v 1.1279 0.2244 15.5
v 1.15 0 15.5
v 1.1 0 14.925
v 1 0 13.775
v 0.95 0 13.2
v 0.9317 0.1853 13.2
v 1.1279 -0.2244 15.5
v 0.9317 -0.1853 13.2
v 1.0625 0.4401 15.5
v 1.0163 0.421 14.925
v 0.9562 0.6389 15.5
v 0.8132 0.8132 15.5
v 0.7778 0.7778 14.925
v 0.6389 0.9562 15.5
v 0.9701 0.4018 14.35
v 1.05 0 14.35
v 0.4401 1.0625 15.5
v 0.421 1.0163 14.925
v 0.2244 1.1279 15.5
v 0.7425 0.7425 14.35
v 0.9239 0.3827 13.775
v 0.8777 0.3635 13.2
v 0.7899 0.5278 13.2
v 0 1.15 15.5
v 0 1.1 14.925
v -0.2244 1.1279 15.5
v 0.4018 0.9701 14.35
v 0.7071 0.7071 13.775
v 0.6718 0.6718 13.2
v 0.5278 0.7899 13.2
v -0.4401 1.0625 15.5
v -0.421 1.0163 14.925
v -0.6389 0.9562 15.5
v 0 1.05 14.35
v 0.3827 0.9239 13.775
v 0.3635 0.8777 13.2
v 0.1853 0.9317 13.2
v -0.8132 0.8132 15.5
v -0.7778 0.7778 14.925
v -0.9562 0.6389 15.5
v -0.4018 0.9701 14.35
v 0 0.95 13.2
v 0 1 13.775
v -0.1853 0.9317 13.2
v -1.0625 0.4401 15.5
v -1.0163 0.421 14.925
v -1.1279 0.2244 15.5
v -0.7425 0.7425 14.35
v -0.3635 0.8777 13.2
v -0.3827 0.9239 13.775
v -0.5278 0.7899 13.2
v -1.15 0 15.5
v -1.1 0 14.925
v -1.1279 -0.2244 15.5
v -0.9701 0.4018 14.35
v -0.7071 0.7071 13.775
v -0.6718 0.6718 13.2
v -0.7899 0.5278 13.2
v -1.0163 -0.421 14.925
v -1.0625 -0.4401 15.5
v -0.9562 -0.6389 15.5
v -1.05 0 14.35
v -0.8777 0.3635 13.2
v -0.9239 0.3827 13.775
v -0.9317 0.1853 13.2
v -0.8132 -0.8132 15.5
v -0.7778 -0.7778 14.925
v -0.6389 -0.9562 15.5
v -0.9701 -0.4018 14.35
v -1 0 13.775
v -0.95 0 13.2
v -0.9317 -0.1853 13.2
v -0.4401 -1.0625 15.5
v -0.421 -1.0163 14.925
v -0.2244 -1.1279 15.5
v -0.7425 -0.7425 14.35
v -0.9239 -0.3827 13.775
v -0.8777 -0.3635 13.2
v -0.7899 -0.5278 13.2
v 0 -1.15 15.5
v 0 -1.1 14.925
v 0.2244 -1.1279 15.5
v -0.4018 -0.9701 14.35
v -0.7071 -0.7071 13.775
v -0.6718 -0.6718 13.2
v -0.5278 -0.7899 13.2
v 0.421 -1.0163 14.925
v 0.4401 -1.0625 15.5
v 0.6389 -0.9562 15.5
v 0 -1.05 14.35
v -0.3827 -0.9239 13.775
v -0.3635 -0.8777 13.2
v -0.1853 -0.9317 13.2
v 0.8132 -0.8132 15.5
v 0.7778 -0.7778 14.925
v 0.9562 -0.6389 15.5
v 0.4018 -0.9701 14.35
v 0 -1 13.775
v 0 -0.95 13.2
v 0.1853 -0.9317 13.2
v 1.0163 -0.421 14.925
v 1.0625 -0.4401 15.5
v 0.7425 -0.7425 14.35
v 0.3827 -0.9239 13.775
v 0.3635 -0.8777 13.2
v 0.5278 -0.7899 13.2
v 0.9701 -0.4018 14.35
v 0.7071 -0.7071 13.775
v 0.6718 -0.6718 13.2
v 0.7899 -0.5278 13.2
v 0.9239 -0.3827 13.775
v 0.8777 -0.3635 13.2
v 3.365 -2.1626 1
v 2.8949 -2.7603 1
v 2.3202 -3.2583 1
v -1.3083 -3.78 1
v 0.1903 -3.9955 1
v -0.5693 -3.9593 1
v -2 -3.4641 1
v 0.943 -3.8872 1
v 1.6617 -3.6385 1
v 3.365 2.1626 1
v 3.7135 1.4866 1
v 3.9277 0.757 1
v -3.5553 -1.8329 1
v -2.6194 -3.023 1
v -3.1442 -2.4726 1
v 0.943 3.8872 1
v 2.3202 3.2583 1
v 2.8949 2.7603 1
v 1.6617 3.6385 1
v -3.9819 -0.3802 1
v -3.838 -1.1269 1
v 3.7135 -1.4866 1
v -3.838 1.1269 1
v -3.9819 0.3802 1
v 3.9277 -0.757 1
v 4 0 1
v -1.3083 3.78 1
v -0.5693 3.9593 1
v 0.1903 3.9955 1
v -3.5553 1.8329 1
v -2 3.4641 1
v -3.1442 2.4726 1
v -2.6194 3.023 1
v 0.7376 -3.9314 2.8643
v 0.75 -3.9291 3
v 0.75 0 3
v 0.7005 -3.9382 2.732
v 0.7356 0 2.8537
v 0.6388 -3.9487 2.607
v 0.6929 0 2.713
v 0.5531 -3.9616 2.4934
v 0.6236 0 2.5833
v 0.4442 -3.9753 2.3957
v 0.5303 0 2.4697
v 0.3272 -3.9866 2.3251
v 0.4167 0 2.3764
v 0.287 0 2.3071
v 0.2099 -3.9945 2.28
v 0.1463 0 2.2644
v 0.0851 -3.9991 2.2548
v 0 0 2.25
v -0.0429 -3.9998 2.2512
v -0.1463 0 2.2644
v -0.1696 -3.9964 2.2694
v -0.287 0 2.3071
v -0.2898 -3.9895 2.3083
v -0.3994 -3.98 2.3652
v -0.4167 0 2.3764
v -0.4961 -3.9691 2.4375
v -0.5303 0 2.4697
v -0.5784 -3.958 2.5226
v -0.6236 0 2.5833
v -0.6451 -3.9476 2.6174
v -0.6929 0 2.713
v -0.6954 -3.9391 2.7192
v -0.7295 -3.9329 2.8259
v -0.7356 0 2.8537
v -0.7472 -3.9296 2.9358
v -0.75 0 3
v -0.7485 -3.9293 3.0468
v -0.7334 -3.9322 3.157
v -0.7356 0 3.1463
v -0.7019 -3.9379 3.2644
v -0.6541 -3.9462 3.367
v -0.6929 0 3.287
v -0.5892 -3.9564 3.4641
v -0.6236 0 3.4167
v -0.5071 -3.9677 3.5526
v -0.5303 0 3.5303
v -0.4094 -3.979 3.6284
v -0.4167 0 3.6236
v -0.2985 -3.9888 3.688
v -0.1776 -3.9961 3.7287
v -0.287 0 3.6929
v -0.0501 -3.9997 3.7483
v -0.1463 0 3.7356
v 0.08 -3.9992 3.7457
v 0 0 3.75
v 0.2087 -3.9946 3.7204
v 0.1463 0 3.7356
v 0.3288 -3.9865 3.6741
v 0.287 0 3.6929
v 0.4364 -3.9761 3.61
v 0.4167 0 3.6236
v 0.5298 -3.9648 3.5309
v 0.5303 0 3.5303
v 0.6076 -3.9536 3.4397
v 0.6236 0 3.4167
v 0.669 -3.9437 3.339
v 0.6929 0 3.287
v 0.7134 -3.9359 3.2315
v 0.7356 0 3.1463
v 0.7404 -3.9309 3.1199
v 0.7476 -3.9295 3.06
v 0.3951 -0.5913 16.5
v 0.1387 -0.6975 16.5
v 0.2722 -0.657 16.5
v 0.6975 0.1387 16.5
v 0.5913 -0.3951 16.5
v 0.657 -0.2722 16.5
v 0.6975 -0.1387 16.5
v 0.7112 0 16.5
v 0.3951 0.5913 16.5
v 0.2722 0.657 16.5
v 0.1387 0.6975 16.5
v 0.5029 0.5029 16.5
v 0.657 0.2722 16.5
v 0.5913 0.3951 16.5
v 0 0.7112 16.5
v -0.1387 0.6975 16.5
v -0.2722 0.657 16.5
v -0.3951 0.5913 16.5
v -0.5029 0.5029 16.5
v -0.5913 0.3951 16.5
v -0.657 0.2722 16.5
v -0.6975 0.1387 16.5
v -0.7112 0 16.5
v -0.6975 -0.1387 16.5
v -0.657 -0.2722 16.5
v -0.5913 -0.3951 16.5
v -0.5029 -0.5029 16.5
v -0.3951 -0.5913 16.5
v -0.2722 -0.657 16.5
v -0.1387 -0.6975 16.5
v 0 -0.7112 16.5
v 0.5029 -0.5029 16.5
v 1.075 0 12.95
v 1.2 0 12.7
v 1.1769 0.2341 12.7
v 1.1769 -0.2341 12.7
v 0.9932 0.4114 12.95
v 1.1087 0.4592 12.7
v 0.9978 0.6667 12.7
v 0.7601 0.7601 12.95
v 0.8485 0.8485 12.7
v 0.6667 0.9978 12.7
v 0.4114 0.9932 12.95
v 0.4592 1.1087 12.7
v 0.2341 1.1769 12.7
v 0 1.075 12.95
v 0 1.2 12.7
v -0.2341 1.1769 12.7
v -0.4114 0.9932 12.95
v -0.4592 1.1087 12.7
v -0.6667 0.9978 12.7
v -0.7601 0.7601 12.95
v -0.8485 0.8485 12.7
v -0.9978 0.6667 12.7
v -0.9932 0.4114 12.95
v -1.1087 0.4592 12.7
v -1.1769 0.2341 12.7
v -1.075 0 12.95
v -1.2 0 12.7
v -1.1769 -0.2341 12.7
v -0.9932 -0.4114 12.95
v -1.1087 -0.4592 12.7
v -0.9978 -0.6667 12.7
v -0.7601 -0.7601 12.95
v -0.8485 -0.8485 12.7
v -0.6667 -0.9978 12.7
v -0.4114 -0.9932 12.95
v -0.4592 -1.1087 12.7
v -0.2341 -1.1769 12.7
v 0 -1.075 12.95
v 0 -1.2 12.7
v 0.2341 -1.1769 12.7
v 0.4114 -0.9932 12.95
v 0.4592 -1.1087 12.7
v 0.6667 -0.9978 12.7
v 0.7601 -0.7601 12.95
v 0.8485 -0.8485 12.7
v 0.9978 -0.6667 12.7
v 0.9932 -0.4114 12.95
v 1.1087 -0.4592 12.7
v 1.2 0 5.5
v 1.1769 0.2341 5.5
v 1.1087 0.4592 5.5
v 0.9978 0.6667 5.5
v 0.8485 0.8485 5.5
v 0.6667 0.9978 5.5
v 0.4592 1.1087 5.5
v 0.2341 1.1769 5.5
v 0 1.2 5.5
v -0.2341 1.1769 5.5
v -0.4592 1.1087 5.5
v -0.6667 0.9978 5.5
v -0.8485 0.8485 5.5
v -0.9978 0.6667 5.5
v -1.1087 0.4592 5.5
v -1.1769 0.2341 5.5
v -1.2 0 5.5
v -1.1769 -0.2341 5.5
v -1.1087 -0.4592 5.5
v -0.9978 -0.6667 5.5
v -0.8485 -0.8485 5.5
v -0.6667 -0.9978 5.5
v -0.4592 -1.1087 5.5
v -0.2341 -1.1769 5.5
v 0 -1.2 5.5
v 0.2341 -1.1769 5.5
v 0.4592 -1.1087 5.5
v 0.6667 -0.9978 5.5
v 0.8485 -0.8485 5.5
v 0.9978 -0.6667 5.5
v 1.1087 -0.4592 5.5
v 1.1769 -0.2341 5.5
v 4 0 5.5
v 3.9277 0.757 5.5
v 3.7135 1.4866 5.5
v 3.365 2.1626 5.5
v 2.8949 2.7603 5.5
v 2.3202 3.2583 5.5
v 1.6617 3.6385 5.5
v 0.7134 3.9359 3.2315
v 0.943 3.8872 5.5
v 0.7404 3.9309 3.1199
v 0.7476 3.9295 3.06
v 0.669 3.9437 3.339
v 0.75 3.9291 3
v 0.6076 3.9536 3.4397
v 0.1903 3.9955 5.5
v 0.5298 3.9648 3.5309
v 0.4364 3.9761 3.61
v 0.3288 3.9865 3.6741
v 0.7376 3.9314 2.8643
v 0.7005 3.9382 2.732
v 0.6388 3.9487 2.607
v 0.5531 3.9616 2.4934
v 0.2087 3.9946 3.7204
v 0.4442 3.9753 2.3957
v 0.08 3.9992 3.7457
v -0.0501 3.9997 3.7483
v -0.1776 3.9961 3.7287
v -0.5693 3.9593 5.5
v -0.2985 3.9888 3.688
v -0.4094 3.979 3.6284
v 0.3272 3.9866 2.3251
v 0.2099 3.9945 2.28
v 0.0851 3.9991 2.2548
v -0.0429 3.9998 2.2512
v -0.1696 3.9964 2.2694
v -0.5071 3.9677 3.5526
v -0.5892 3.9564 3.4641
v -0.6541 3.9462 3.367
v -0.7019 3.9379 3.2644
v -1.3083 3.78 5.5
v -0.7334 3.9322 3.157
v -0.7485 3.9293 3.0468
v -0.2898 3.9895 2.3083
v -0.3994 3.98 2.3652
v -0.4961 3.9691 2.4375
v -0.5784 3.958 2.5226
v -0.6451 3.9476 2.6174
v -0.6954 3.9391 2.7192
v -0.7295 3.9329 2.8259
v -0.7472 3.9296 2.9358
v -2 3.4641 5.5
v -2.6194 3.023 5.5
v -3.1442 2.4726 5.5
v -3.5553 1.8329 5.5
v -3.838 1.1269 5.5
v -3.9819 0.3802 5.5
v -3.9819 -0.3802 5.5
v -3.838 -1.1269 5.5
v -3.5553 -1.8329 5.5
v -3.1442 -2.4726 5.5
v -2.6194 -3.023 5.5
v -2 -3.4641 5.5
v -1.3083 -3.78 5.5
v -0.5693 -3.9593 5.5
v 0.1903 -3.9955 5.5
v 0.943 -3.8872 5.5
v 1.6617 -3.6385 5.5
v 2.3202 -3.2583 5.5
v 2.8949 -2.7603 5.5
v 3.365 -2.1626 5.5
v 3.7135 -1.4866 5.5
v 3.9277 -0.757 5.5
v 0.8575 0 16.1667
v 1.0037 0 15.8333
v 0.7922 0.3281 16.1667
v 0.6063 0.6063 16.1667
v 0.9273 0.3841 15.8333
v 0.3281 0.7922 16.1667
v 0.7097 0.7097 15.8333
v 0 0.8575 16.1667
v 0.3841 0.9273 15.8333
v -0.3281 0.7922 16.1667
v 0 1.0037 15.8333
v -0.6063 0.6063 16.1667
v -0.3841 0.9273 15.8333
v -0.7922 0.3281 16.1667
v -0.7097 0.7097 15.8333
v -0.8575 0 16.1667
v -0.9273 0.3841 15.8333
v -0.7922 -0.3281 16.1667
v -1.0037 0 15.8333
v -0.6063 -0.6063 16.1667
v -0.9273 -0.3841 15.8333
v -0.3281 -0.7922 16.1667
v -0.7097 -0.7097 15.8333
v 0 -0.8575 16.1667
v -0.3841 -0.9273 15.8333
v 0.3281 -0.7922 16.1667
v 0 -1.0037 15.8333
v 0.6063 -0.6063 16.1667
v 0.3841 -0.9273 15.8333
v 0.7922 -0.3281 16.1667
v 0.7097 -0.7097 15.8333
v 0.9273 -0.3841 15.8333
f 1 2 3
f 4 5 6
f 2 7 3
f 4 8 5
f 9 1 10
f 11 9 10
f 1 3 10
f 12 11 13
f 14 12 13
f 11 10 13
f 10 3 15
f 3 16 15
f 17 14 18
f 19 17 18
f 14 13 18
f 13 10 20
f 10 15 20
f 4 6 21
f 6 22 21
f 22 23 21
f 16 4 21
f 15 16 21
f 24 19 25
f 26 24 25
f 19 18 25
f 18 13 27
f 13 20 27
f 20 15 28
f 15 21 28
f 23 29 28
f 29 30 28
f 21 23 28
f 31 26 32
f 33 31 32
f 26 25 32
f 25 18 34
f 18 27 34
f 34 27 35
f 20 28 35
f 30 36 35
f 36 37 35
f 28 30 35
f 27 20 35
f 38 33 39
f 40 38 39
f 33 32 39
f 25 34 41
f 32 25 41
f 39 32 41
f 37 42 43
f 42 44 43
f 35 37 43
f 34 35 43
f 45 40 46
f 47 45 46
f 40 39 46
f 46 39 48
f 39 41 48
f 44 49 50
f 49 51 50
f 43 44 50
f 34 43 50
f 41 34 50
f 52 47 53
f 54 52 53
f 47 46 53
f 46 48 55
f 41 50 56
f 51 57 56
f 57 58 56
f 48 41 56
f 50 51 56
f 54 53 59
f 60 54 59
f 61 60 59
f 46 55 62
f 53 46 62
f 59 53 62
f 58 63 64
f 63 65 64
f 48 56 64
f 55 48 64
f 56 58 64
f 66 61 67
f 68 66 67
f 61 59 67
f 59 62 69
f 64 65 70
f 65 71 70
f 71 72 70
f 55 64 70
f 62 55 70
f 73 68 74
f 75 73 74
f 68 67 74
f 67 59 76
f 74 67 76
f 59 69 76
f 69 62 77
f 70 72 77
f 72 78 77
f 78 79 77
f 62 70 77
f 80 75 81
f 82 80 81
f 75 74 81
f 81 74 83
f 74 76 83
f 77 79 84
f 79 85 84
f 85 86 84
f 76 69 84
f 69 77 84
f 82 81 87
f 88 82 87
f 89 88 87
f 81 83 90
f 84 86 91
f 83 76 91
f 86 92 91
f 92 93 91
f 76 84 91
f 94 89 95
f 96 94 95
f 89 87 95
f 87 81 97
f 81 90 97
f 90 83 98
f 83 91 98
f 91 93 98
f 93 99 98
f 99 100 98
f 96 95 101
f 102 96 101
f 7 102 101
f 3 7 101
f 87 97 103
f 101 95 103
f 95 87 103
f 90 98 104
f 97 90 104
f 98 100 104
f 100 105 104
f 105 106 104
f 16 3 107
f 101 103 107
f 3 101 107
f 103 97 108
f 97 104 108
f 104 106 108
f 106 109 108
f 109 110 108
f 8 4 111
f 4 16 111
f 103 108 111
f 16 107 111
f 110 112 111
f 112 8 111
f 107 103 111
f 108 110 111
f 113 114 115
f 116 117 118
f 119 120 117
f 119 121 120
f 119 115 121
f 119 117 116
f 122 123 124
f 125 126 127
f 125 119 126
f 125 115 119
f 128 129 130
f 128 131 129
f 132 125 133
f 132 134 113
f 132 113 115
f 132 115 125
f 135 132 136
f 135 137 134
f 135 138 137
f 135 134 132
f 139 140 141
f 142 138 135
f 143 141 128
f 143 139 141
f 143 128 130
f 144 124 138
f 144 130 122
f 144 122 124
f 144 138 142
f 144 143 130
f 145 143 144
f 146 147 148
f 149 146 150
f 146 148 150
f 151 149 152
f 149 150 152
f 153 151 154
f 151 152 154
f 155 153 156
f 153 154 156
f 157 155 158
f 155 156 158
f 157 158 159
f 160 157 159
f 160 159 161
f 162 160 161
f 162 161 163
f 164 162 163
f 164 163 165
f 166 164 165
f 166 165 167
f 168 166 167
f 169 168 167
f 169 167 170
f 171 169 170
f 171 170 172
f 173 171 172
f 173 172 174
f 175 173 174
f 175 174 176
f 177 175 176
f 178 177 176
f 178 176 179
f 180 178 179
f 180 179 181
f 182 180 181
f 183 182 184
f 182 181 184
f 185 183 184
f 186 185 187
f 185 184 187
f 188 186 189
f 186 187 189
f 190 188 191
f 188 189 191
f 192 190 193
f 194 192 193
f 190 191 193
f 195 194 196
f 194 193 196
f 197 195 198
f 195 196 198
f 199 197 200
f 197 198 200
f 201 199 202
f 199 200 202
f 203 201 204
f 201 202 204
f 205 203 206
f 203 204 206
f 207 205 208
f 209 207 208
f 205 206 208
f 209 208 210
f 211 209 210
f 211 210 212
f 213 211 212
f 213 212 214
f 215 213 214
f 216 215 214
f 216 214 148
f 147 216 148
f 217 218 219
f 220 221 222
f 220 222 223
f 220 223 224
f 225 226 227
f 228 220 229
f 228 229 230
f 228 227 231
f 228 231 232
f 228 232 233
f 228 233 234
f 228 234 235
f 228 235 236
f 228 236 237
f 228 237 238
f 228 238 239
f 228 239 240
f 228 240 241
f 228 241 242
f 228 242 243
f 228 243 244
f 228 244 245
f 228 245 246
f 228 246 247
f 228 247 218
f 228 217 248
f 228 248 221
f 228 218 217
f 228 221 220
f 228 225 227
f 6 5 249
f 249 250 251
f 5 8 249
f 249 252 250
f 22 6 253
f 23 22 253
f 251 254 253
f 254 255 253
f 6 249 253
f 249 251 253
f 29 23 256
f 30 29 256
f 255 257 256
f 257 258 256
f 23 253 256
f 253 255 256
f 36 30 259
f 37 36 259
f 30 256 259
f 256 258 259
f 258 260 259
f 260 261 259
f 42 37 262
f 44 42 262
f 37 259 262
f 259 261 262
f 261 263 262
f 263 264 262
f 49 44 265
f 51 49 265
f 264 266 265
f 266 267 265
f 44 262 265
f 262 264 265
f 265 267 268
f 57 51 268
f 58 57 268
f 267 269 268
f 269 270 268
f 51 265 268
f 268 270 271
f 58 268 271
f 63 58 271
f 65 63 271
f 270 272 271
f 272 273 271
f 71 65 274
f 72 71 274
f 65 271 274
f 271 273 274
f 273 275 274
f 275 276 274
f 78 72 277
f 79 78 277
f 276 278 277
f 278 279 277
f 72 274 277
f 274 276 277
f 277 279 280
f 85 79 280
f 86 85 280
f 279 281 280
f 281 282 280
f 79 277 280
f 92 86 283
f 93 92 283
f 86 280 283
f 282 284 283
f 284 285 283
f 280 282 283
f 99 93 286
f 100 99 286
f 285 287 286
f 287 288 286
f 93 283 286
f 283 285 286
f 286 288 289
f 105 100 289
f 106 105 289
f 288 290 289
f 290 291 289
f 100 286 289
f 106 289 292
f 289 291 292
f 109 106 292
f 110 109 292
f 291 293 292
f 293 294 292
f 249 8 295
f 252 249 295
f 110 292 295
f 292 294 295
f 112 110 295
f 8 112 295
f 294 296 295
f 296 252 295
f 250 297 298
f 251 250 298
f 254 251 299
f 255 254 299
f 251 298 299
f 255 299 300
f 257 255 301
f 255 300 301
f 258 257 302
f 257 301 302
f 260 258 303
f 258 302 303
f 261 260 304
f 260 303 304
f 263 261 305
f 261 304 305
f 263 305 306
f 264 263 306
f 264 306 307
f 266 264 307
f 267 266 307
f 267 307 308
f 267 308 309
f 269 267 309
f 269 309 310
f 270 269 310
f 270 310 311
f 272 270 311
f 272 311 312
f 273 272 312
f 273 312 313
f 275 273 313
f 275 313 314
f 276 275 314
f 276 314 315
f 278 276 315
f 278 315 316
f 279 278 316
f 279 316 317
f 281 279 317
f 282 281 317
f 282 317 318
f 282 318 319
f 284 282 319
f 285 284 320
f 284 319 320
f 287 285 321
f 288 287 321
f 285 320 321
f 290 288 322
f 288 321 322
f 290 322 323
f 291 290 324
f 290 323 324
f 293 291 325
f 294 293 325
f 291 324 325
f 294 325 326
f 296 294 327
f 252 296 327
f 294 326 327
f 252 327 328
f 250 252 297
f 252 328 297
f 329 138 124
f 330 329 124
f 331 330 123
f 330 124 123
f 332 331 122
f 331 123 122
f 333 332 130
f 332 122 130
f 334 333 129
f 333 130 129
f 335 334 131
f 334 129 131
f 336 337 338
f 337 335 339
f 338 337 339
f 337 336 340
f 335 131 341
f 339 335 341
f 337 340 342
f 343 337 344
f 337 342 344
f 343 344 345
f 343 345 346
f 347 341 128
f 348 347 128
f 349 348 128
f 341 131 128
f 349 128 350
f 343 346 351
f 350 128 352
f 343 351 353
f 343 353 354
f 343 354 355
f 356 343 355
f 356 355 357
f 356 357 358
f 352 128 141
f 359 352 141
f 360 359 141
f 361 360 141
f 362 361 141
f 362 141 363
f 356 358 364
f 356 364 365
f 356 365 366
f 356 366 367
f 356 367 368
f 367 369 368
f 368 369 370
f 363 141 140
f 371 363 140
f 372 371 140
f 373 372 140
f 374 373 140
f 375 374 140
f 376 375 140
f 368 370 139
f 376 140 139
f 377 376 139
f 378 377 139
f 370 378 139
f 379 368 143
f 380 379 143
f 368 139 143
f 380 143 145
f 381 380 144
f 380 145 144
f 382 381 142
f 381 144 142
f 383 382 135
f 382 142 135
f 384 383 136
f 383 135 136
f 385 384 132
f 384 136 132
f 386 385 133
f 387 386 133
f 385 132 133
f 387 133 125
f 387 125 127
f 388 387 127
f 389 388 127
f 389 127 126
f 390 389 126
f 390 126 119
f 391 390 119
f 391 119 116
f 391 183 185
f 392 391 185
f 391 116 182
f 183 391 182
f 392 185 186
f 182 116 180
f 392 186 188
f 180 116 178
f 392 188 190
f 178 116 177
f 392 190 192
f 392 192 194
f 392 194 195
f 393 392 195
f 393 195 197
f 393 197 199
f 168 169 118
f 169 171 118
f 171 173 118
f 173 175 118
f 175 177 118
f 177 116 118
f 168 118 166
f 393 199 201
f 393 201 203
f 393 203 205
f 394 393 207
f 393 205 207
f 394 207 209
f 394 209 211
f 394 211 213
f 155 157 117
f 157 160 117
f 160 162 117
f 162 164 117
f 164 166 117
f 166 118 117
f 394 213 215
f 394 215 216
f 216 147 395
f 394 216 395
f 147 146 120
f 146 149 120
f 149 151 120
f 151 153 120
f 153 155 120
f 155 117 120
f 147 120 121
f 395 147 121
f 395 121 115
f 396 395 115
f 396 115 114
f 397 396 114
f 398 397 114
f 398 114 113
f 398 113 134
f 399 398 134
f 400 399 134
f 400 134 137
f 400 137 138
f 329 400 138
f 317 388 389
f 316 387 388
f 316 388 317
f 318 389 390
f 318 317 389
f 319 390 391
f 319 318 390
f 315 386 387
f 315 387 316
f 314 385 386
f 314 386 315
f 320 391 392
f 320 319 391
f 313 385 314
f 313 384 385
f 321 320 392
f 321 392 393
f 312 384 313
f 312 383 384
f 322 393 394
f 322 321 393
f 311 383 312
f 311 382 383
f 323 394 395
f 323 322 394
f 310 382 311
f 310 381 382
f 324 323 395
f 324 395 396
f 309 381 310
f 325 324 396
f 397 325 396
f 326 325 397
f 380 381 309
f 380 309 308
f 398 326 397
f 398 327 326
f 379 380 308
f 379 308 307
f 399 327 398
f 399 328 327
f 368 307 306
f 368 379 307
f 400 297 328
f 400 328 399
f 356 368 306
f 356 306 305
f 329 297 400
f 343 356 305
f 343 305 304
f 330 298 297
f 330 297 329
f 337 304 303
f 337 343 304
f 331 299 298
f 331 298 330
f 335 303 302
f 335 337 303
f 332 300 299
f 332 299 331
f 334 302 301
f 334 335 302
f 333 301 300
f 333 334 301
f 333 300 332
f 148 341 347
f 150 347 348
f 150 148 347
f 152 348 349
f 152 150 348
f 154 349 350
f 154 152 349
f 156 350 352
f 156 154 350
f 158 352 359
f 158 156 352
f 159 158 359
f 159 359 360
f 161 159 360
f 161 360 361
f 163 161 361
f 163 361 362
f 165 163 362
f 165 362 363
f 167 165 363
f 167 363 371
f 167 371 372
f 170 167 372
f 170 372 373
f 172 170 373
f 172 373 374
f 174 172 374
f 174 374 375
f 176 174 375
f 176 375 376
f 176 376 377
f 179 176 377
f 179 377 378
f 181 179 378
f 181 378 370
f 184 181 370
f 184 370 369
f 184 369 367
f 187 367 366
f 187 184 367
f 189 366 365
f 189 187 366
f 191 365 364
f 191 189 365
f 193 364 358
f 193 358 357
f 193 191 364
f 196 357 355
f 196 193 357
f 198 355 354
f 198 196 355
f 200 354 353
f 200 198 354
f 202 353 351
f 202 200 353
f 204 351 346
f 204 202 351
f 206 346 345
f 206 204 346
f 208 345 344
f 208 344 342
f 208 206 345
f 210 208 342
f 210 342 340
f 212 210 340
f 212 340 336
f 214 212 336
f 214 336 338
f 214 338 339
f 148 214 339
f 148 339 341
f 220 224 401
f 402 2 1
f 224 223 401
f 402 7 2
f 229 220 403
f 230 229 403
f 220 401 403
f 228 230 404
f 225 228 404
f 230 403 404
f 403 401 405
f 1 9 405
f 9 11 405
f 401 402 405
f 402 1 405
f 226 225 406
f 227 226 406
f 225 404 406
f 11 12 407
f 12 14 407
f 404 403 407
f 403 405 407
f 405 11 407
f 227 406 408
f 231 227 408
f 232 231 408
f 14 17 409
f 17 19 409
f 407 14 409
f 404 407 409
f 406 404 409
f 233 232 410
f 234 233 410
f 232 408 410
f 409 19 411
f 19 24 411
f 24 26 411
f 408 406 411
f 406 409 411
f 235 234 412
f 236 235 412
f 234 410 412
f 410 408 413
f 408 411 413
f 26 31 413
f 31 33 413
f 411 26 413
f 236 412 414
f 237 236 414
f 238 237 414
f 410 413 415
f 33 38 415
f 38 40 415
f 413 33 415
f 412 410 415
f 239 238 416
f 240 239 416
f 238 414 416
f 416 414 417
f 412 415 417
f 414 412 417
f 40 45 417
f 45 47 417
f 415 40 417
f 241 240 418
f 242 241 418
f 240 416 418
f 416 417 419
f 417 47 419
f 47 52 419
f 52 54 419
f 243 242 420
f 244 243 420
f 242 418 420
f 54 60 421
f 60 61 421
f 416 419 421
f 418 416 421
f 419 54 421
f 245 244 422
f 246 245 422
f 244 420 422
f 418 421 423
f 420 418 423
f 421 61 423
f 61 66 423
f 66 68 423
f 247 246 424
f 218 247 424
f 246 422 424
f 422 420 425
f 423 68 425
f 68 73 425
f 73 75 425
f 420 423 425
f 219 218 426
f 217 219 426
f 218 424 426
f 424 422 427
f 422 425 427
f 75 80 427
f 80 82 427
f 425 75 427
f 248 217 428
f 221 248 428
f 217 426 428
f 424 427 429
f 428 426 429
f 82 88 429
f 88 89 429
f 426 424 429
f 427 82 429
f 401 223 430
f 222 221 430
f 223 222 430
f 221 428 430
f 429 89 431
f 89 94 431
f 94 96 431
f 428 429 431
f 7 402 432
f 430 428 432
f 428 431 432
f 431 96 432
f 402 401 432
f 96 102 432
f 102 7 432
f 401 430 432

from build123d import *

# Parameters (mm, degrees)
SKETCH_1_R               = 4
EXTRUDE_1_DEPTH          = 5.5
SKETCH_2_R               = 1.2
EXTRUDE_2_DEPTH          = 11
SKETCH_6_R               = 0.75
CUT_EXTRUDE_1_DEPTH      = 5
CUT_EXTRUDE_1_DEPTH_BACK = 5
SKETCH_7_R               = 4
CUT_EXTRUDE_2_DEPTH      = 1


with BuildPart() as part:
    # ｽｹｯﾁ1 → ﾎﾞｽ - 押し出し1 (new body)
    with BuildSketch(Plane.XY):
        Circle(SKETCH_1_R)
    extrude(amount=EXTRUDE_1_DEPTH)

    # ｽｹｯﾁ2 → ﾎﾞｽ - 押し出し2 (add)
    with BuildSketch(Plane.XY.offset(5.5)):
        Circle(SKETCH_2_R)
    extrude(amount=EXTRUDE_2_DEPTH)

    # ｽｹｯﾁ4 → ｶｯﾄ - 回転1 (revolve, cut)
    with BuildSketch(Plane(origin=(0, 0, 0), x_dir=(1, 0, 0), z_dir=(0, 1, 0))):
        Polygon((1.2, -16.5), (0.711175277, -16.5), (1.15, -15.5), (0.95, -13.2), (1.2, -12.7), align=None)
    revolve(axis=Axis((0, 0, 12.792952675), (0, 0, 1)), mode=Mode.SUBTRACT)

    # ｽｹｯﾁ6 → ｶｯﾄ - 押し出し1 (cut, two sides)
    with BuildSketch(Plane(origin=(0, 0, 0), x_dir=(1, 0, 0), z_dir=(0, 1, 0))) as cut_extrude_1_sk:
        with Locations((0, -3)):
            Circle(SKETCH_6_R)
    extrude(amount=CUT_EXTRUDE_1_DEPTH, mode=Mode.SUBTRACT)
    extrude(cut_extrude_1_sk.sketch, amount=-CUT_EXTRUDE_1_DEPTH_BACK, mode=Mode.SUBTRACT)

    # ｽｹｯﾁ7 → ｶｯﾄ - 押し出し2 (cut)
    with BuildSketch(Plane(origin=(0, 0, 0), x_dir=(-1, 0, 0), z_dir=(0, 0, -1))):
        Circle(SKETCH_7_R)
    extrude(amount=-CUT_EXTRUDE_2_DEPTH, mode=Mode.SUBTRACT)


solid = part.part
